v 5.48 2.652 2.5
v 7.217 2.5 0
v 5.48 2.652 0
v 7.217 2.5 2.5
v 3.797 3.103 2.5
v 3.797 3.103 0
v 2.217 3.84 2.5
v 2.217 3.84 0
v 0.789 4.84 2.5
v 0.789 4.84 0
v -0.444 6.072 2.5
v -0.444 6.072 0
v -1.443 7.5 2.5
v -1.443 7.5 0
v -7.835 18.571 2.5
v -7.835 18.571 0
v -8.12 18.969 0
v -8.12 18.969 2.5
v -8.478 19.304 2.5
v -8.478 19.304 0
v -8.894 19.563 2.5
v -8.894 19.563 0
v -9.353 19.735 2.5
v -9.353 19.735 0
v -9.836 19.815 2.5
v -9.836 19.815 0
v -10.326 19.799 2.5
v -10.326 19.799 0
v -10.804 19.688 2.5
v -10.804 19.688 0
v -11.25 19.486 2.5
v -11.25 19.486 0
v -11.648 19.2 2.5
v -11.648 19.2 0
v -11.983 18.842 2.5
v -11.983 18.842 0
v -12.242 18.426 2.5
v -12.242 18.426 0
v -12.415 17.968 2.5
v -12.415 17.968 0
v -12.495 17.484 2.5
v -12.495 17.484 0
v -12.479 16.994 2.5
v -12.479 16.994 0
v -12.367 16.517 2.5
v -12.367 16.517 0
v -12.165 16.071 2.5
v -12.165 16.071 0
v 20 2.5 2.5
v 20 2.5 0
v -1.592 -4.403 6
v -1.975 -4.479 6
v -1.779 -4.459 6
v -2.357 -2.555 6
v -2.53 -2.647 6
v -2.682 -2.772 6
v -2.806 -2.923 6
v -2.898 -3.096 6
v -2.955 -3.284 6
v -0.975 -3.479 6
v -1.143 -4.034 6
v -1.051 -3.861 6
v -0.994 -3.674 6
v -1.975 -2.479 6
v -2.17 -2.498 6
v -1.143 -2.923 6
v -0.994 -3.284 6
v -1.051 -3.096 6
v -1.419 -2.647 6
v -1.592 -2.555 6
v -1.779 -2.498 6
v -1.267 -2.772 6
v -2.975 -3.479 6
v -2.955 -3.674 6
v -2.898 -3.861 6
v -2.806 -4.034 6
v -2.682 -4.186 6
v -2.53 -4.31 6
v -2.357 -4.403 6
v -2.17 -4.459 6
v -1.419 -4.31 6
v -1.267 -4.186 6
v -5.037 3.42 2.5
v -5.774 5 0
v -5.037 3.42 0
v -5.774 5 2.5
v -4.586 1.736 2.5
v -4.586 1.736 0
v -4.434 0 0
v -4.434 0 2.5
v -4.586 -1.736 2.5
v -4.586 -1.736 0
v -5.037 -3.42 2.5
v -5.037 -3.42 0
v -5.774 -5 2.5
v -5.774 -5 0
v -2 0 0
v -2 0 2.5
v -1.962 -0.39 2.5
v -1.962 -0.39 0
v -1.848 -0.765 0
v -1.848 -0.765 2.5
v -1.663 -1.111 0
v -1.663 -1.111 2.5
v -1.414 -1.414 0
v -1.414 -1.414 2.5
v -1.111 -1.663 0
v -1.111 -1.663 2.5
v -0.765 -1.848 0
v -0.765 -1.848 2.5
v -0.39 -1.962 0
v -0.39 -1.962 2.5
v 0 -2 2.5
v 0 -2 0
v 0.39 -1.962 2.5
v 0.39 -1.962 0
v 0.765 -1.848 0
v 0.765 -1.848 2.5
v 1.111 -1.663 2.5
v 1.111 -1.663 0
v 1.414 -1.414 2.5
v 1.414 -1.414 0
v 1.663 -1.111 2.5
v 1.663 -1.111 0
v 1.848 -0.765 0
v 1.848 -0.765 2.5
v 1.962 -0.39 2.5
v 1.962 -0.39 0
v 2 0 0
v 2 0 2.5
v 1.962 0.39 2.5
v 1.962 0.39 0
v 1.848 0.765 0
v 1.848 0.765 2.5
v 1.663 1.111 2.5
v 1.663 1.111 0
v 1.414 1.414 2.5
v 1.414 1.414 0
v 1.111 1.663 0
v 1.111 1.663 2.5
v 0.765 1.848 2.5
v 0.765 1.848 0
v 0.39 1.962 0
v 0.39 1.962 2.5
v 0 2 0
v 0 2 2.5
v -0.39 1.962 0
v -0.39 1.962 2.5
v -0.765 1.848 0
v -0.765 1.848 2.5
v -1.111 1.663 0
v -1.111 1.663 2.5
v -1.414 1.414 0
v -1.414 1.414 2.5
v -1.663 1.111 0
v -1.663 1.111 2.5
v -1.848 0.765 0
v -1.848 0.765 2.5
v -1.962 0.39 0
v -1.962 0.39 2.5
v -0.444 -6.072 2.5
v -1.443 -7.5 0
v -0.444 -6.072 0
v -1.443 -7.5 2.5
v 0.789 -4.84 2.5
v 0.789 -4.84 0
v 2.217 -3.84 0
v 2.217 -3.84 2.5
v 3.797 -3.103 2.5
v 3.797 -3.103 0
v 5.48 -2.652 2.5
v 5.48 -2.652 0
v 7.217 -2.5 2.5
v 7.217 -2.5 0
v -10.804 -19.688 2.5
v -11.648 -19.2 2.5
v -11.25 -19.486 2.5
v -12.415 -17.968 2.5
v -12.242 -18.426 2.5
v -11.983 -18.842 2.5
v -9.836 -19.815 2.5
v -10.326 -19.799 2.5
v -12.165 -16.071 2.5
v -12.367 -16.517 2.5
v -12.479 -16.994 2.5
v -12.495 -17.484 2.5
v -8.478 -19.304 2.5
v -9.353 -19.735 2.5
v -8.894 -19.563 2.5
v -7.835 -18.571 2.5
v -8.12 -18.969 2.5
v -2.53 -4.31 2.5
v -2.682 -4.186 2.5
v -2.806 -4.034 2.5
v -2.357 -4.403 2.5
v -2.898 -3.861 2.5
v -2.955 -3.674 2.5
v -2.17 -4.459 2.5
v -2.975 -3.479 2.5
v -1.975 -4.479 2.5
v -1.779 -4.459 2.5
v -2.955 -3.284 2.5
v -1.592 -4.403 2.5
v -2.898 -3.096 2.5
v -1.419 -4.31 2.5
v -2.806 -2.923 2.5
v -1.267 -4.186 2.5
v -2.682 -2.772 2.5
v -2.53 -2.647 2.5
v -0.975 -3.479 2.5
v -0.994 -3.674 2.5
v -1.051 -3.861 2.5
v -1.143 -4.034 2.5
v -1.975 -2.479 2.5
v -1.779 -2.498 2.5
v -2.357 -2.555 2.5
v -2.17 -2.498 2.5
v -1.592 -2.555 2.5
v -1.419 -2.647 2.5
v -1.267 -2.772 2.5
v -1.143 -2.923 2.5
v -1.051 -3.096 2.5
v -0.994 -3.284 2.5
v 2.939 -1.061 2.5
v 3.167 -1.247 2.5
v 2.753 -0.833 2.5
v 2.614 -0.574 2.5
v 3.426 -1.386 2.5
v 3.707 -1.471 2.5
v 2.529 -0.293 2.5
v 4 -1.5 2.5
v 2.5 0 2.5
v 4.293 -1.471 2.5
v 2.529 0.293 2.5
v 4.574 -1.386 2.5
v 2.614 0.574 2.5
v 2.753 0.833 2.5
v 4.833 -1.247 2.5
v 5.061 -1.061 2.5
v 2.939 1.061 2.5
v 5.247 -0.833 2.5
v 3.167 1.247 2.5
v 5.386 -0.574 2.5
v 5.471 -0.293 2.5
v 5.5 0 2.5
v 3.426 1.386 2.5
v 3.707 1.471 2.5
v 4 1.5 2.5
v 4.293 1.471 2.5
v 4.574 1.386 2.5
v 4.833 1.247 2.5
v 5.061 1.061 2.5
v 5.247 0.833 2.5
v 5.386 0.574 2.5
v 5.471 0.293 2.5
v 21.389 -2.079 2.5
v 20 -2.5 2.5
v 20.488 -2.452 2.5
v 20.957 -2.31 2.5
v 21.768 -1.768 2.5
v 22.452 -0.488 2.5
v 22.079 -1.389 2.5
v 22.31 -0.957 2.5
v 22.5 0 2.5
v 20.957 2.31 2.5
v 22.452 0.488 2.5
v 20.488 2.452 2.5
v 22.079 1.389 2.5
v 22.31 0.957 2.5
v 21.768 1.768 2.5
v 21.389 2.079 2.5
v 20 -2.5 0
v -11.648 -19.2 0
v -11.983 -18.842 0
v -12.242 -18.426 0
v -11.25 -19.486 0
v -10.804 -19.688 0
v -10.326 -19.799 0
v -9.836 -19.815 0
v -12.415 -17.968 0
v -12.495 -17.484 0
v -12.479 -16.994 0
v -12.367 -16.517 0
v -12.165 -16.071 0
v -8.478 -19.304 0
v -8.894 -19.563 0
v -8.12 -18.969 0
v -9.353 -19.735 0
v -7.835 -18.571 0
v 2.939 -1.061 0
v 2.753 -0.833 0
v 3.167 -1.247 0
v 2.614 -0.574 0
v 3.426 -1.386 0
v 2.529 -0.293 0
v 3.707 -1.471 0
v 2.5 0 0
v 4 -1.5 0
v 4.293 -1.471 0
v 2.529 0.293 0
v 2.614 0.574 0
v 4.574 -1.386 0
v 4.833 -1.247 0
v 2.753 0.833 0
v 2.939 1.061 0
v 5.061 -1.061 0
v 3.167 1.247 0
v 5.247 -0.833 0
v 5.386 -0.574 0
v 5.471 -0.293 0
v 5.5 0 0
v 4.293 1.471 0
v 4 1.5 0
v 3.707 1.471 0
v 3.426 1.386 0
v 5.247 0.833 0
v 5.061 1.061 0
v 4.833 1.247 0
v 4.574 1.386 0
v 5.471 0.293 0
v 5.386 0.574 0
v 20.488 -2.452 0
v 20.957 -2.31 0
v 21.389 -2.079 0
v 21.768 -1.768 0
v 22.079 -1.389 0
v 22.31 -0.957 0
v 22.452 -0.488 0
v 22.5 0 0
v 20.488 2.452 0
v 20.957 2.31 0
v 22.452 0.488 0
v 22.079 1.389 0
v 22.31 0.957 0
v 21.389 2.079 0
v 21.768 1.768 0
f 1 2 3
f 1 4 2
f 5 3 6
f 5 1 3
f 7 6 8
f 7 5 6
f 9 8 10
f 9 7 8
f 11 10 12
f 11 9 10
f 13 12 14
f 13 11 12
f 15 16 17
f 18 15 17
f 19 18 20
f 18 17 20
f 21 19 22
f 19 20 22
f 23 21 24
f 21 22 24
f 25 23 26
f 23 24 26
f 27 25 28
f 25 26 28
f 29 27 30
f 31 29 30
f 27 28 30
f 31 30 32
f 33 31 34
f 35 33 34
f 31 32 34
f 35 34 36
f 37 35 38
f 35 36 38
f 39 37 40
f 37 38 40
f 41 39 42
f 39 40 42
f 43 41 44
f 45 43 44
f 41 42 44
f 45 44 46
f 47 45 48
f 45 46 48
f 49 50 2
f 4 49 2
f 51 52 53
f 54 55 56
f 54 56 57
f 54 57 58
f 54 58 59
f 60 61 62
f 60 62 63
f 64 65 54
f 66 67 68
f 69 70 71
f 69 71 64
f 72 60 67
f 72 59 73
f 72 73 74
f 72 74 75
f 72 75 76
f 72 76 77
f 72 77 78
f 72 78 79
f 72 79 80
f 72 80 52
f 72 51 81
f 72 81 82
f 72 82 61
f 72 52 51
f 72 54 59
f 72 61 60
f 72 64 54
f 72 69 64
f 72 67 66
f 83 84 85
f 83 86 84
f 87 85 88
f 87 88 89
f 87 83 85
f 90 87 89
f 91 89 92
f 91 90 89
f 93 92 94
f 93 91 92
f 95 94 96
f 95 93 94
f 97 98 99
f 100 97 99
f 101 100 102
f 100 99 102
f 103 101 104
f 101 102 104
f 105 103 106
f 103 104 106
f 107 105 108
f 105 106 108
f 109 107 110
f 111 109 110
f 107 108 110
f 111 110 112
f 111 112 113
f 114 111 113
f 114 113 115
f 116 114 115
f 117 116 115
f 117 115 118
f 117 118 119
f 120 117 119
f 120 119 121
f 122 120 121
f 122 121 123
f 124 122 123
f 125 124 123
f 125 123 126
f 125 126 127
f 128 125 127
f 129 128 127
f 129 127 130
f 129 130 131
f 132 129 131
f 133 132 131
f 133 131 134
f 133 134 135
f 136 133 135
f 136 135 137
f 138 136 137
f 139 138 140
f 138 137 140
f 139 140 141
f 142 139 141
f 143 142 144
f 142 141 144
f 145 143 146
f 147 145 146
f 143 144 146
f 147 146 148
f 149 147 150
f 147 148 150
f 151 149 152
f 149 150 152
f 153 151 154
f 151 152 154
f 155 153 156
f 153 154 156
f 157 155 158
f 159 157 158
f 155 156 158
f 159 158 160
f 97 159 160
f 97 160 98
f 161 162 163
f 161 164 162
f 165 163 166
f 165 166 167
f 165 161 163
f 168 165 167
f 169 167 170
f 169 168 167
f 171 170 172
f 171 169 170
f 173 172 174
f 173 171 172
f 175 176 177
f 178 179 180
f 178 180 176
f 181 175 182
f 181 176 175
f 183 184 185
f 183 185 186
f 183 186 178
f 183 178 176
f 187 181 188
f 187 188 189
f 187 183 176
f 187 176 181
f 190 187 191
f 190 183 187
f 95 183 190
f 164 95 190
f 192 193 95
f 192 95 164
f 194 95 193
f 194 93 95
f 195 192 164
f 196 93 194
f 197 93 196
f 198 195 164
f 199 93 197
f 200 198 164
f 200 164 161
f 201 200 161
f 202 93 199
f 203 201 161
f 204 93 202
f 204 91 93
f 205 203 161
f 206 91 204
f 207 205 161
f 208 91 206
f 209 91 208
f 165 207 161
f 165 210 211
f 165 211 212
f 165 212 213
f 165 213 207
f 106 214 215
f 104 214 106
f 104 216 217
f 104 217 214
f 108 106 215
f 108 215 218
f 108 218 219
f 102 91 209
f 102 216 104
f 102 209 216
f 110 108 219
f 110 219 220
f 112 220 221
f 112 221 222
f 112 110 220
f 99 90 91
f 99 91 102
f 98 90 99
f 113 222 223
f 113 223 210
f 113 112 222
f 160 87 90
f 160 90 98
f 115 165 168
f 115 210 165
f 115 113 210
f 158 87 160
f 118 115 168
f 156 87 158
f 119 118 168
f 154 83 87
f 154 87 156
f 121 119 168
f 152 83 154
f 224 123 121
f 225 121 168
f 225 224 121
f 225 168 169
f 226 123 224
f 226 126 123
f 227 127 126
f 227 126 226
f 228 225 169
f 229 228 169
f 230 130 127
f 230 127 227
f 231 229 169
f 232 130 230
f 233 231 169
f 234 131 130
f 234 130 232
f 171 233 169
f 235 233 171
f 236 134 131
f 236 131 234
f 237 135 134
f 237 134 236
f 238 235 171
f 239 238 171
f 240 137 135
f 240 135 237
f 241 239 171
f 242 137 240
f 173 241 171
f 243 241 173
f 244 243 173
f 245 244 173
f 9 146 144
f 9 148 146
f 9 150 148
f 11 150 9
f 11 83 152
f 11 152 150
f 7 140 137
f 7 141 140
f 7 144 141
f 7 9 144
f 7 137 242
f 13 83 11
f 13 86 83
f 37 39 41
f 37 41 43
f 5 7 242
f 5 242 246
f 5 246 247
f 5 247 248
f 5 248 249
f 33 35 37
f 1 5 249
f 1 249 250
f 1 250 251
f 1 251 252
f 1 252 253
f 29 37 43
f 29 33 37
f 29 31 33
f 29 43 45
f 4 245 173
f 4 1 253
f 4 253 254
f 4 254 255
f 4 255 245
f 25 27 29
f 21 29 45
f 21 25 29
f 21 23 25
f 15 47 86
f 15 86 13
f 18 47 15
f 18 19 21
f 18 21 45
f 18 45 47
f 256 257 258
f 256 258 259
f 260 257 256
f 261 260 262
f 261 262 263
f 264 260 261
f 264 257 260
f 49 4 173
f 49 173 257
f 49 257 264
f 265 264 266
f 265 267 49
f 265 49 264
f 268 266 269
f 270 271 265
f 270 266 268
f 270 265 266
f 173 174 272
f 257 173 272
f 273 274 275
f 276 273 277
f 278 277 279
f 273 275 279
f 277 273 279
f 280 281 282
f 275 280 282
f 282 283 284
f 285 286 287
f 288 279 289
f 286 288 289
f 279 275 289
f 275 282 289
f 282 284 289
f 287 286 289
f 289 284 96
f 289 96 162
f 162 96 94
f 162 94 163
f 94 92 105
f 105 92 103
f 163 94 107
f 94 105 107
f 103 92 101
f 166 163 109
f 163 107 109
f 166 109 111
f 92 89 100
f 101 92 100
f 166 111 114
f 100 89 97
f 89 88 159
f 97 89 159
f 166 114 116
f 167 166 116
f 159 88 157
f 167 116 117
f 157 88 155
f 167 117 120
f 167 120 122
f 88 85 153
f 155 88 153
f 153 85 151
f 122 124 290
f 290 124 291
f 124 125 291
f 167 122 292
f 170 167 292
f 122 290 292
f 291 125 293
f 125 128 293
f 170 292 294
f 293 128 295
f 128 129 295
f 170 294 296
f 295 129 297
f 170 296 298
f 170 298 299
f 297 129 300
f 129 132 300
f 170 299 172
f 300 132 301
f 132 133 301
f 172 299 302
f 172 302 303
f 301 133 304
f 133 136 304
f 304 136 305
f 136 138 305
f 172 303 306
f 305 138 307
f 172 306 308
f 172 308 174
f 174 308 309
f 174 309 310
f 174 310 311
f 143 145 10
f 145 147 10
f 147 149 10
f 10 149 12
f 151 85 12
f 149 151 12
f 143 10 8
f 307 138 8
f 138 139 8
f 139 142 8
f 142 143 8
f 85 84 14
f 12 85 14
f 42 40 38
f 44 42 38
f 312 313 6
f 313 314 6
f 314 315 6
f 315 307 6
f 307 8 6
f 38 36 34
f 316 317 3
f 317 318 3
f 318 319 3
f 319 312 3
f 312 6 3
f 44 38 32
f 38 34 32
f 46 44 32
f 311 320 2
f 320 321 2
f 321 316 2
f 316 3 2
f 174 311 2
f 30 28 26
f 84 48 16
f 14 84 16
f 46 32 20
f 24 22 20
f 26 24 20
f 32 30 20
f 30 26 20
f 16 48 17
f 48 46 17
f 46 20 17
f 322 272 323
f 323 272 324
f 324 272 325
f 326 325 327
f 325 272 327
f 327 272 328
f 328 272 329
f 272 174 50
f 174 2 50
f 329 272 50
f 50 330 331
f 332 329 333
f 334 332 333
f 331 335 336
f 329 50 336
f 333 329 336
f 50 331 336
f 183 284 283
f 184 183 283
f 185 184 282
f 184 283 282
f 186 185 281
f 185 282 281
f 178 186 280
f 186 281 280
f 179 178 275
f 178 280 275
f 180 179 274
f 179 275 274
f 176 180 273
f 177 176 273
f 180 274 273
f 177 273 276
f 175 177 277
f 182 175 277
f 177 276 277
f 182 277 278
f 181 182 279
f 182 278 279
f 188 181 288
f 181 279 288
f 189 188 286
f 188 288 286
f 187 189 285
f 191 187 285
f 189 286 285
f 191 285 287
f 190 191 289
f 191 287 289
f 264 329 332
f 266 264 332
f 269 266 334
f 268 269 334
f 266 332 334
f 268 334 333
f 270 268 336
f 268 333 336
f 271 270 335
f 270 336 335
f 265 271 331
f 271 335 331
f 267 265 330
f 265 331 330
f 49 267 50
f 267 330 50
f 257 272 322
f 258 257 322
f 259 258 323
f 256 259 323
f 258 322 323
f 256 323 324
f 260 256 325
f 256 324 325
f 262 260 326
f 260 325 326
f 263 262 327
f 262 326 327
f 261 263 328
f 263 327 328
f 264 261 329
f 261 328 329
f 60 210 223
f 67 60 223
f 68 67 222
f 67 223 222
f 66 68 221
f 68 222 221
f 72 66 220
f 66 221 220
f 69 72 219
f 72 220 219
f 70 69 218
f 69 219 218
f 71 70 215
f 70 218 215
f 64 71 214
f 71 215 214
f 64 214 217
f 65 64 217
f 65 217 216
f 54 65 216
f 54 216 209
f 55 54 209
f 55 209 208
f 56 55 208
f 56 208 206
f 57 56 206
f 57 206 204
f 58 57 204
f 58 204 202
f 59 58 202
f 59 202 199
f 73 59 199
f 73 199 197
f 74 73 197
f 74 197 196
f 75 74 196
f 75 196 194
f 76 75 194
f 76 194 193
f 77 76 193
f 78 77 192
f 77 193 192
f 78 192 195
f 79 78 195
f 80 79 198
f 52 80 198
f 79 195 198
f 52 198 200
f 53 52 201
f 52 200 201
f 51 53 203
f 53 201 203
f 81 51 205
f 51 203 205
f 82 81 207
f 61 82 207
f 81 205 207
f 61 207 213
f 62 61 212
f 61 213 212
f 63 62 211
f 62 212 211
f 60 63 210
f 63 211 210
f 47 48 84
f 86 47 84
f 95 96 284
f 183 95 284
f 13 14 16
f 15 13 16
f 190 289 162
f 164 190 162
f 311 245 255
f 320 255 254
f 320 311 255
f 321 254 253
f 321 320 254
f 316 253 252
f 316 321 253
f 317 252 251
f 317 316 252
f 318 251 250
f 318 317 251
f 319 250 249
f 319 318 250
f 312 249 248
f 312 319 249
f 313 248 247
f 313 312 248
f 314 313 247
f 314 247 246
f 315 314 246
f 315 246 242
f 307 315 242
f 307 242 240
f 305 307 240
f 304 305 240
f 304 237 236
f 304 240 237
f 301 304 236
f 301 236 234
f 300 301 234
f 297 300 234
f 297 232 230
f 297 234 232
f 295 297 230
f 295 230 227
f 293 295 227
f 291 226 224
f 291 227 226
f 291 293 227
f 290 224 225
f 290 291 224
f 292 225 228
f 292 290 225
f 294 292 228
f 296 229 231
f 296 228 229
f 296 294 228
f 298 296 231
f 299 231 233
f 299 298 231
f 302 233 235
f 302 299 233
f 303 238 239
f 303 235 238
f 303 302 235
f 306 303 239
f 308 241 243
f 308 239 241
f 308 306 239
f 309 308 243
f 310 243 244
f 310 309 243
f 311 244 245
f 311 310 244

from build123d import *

# Parameters (mm, degrees)
F1_DEPTH = 2.5
F3_R     = 10
F4_D     = 4
F5_R     = 1
F6_DEPTH = 6
F7_R     = 1.5
F8_DEPTH = 7


with BuildPart() as f1:
    # F0 (on Top) → F1 (new body)
    with BuildSketch(Plane.XY):
        with BuildLine():
            ThreePointArc((20, -2.5), (21.767766953, -1.767766953), (22.5, 0))
            ThreePointArc((22.5, 0), (21.767766953, 1.767766953), (20, 2.5))
            ThreePointArc((20, 2.5), (18.232233047, 1.767766953), (17.5, 0))
            ThreePointArc((17.5, 0), (18.232233047, -1.767766953), (20, -2.5))
        make_face()
        with BuildLine():
            ThreePointArc((17.5, 0), (18.232233047, 1.767766953), (20, 2.5))
            Line((20, 2.5), (1.443375673, 2.5))
            Line((1.443375673, 2.5), (2.1650635095, 1.25))
            ThreePointArc((2.1650635095, 1.25), (2.4148145657, 0.6470476128), (2.5, 0))
            Line((2.5, 0), (17.5, 0))
        make_face()
        with BuildLine():
            Line((1.443375673, -2.5), (20, -2.5))
            ThreePointArc((20, -2.5), (18.232233047, -1.767766953), (17.5, 0))
            Line((17.5, 0), (2.5, 0))
            ThreePointArc((2.5, 0), (2.4148145657, -0.6470476128), (2.1650635095, -1.25))
            Line((2.1650635095, -1.25), (1.443375673, -2.5))
        make_face()
        with BuildLine():
            Line((2.1650635095, 1.25), (1.443375673, 2.5))
            Line((1.443375673, 2.5), (0, 2.5))
            ThreePointArc((0, 2.5), (1.25, 2.1650635095), (2.1650635095, 1.25))
        make_face()
        with BuildLine():
            Line((0, 2.5), (1.443375673, 2.5))
            Line((1.443375673, 2.5), (-7.8349364905, 18.5705080757))
            ThreePointArc((-7.8349364905, 18.5705080757), (-7.5851854343, 17.9675556884), (-7.5, 17.3205080757))
            ThreePointArc((-7.5, 17.3205080757), (-7.8349364905, 16.0705080757), (-8.75, 15.1554445662))
            Line((-8.75, 15.1554445662), (-1.25, 2.1650635095))
            ThreePointArc((-1.25, 2.1650635095), (-0.6470476128, 2.4148145657), (0, 2.5))
        make_face()
        with BuildLine():
            Line((-7.8349364905, -18.5705080757), (1.443375673, -2.5))
            Line((1.443375673, -2.5), (0, -2.5))
            ThreePointArc((0, -2.5), (-0.6470476128, -2.4148145657), (-1.25, -2.1650635095))
            Line((-1.25, -2.1650635095), (-8.75, -15.1554445662))
            ThreePointArc((-8.75, -15.1554445662), (-7.8349364905, -16.0705080757), (-7.5, -17.3205080757))
            ThreePointArc((-7.5, -17.3205080757), (-7.5851854343, -17.9675556884), (-7.8349364905, -18.5705080757))
        make_face()
        with BuildLine():
            Line((0, -2.5), (1.443375673, -2.5))
            Line((1.443375673, -2.5), (2.1650635095, -1.25))
            ThreePointArc((2.1650635095, -1.25), (1.25, -2.1650635095), (0, -2.5))
        make_face()
        with BuildLine():
            ThreePointArc((-7.5, 17.3205080757), (-7.5851854343, 17.9675556884), (-7.8349364905, 18.5705080757))
            ThreePointArc((-7.8349364905, 18.5705080757), (-11.25, 19.4855715851), (-12.1650635095, 16.0705080757))
            ThreePointArc((-12.1650635095, 16.0705080757), (-10.6470476128, 14.90569351), (-8.75, 15.1554445662))
            ThreePointArc((-8.75, 15.1554445662), (-7.8349364905, 16.0705080757), (-7.5, 17.3205080757))
        make_face()
        with BuildLine():
            ThreePointArc((-12.1650635095, -16.0705080757), (-11.25, -19.4855715851), (-7.8349364905, -18.5705080757))
            ThreePointArc((-7.8349364905, -18.5705080757), (-7.5851854343, -17.9675556884), (-7.5, -17.3205080757))
            ThreePointArc((-7.5, -17.3205080757), (-7.8349364905, -16.0705080757), (-8.75, -15.1554445662))
            ThreePointArc((-8.75, -15.1554445662), (-10.6470476128, -14.90569351), (-12.1650635095, -16.0705080757))
        make_face()
        with BuildLine():
            ThreePointArc((-2.1650635095, 1.25), (-1.767766953, 1.767766953), (-1.25, 2.1650635095))
            Line((-1.25, 2.1650635095), (-8.75, 15.1554445662))
            ThreePointArc((-8.75, 15.1554445662), (-10.6470476128, 14.90569351), (-12.1650635095, 16.0705080757))
            Line((-12.1650635095, 16.0705080757), (-2.8867513459, 0))
            Line((-2.8867513459, 0), (-2.1650635095, 1.25))
        make_face()
        with BuildLine():
            Line((-8.75, -15.1554445662), (-1.25, -2.1650635095))
            ThreePointArc((-1.25, -2.1650635095), (-1.767766953, -1.767766953), (-2.1650635095, -1.25))
            Line((-2.1650635095, -1.25), (-2.8867513459, 0))
            Line((-2.8867513459, 0), (-12.1650635095, -16.0705080757))
            ThreePointArc((-12.1650635095, -16.0705080757), (-10.6470476128, -14.90569351), (-8.75, -15.1554445662))
        make_face()
        with BuildLine():
            ThreePointArc((-2.1650635095, -1.25), (-2.5, 0), (-2.1650635095, 1.25))
            Line((-2.1650635095, 1.25), (-2.8867513459, 0))
            Line((-2.8867513459, 0), (-2.1650635095, -1.25))
        make_face()
        with BuildLine():
            Line((-1.25, -2.1650635095), (0, 0))
            Line((0, 0), (-1.25, 2.1650635095))
            ThreePointArc((-1.25, 2.1650635095), (-1.767766953, 1.767766953), (-2.1650635095, 1.25))
            ThreePointArc((-2.1650635095, 1.25), (-2.5, 0), (-2.1650635095, -1.25))
            ThreePointArc((-2.1650635095, -1.25), (-1.767766953, -1.767766953), (-1.25, -2.1650635095))
        make_face()
        with BuildLine():
            Line((0, 0), (2.5, 0))
            ThreePointArc((2.5, 0), (2.4148145657, 0.6470476128), (2.1650635095, 1.25))
            ThreePointArc((2.1650635095, 1.25), (1.25, 2.1650635095), (0, 2.5))
            ThreePointArc((0, 2.5), (-0.6470476128, 2.4148145657), (-1.25, 2.1650635095))
            Line((-1.25, 2.1650635095), (0, 0))
        make_face()
        with BuildLine():
            ThreePointArc((2.1650635095, -1.25), (2.4148145657, -0.6470476128), (2.5, 0))
            Line((2.5, 0), (0, 0))
            Line((0, 0), (-1.25, -2.1650635095))
            ThreePointArc((-1.25, -2.1650635095), (-0.6470476128, -2.4148145657), (0, -2.5))
            ThreePointArc((0, -2.5), (1.25, -2.1650635095), (2.1650635095, -1.25))
        make_face()
    extrude(amount=F1_DEPTH)

    # F3
    f3_edges = [f1.edges().sort_by_distance(p)[0] for p in [
        (1.443376, -2.5, 1.25),
        (-2.886751, 0, 1.25),
        (1.443376, 2.5, 1.25),
    ]]
    fillet(f3_edges, radius=F3_R)

    # F4 (through all)
    with Locations(Plane(origin=(0, 0, 0), x_dir=(1, 0, 0), z_dir=(0, 0, -1))):
        with Locations((0, 0)):
            Hole(F4_D / 2)

    # F5 (on Top) → F6 (join)
    with BuildSketch(Plane.XY):
        with Locations((-1.9745181319, -3.478689142)):
            Circle(F5_R)
    extrude(amount=F6_DEPTH)

    # F7 (on Top) → F8 (cut)
    with BuildSketch(Plane.XY):
        with Locations((4, 0)):
            Circle(F7_R)
    extrude(amount=F8_DEPTH, mode=Mode.SUBTRACT)


solid = f1.part
